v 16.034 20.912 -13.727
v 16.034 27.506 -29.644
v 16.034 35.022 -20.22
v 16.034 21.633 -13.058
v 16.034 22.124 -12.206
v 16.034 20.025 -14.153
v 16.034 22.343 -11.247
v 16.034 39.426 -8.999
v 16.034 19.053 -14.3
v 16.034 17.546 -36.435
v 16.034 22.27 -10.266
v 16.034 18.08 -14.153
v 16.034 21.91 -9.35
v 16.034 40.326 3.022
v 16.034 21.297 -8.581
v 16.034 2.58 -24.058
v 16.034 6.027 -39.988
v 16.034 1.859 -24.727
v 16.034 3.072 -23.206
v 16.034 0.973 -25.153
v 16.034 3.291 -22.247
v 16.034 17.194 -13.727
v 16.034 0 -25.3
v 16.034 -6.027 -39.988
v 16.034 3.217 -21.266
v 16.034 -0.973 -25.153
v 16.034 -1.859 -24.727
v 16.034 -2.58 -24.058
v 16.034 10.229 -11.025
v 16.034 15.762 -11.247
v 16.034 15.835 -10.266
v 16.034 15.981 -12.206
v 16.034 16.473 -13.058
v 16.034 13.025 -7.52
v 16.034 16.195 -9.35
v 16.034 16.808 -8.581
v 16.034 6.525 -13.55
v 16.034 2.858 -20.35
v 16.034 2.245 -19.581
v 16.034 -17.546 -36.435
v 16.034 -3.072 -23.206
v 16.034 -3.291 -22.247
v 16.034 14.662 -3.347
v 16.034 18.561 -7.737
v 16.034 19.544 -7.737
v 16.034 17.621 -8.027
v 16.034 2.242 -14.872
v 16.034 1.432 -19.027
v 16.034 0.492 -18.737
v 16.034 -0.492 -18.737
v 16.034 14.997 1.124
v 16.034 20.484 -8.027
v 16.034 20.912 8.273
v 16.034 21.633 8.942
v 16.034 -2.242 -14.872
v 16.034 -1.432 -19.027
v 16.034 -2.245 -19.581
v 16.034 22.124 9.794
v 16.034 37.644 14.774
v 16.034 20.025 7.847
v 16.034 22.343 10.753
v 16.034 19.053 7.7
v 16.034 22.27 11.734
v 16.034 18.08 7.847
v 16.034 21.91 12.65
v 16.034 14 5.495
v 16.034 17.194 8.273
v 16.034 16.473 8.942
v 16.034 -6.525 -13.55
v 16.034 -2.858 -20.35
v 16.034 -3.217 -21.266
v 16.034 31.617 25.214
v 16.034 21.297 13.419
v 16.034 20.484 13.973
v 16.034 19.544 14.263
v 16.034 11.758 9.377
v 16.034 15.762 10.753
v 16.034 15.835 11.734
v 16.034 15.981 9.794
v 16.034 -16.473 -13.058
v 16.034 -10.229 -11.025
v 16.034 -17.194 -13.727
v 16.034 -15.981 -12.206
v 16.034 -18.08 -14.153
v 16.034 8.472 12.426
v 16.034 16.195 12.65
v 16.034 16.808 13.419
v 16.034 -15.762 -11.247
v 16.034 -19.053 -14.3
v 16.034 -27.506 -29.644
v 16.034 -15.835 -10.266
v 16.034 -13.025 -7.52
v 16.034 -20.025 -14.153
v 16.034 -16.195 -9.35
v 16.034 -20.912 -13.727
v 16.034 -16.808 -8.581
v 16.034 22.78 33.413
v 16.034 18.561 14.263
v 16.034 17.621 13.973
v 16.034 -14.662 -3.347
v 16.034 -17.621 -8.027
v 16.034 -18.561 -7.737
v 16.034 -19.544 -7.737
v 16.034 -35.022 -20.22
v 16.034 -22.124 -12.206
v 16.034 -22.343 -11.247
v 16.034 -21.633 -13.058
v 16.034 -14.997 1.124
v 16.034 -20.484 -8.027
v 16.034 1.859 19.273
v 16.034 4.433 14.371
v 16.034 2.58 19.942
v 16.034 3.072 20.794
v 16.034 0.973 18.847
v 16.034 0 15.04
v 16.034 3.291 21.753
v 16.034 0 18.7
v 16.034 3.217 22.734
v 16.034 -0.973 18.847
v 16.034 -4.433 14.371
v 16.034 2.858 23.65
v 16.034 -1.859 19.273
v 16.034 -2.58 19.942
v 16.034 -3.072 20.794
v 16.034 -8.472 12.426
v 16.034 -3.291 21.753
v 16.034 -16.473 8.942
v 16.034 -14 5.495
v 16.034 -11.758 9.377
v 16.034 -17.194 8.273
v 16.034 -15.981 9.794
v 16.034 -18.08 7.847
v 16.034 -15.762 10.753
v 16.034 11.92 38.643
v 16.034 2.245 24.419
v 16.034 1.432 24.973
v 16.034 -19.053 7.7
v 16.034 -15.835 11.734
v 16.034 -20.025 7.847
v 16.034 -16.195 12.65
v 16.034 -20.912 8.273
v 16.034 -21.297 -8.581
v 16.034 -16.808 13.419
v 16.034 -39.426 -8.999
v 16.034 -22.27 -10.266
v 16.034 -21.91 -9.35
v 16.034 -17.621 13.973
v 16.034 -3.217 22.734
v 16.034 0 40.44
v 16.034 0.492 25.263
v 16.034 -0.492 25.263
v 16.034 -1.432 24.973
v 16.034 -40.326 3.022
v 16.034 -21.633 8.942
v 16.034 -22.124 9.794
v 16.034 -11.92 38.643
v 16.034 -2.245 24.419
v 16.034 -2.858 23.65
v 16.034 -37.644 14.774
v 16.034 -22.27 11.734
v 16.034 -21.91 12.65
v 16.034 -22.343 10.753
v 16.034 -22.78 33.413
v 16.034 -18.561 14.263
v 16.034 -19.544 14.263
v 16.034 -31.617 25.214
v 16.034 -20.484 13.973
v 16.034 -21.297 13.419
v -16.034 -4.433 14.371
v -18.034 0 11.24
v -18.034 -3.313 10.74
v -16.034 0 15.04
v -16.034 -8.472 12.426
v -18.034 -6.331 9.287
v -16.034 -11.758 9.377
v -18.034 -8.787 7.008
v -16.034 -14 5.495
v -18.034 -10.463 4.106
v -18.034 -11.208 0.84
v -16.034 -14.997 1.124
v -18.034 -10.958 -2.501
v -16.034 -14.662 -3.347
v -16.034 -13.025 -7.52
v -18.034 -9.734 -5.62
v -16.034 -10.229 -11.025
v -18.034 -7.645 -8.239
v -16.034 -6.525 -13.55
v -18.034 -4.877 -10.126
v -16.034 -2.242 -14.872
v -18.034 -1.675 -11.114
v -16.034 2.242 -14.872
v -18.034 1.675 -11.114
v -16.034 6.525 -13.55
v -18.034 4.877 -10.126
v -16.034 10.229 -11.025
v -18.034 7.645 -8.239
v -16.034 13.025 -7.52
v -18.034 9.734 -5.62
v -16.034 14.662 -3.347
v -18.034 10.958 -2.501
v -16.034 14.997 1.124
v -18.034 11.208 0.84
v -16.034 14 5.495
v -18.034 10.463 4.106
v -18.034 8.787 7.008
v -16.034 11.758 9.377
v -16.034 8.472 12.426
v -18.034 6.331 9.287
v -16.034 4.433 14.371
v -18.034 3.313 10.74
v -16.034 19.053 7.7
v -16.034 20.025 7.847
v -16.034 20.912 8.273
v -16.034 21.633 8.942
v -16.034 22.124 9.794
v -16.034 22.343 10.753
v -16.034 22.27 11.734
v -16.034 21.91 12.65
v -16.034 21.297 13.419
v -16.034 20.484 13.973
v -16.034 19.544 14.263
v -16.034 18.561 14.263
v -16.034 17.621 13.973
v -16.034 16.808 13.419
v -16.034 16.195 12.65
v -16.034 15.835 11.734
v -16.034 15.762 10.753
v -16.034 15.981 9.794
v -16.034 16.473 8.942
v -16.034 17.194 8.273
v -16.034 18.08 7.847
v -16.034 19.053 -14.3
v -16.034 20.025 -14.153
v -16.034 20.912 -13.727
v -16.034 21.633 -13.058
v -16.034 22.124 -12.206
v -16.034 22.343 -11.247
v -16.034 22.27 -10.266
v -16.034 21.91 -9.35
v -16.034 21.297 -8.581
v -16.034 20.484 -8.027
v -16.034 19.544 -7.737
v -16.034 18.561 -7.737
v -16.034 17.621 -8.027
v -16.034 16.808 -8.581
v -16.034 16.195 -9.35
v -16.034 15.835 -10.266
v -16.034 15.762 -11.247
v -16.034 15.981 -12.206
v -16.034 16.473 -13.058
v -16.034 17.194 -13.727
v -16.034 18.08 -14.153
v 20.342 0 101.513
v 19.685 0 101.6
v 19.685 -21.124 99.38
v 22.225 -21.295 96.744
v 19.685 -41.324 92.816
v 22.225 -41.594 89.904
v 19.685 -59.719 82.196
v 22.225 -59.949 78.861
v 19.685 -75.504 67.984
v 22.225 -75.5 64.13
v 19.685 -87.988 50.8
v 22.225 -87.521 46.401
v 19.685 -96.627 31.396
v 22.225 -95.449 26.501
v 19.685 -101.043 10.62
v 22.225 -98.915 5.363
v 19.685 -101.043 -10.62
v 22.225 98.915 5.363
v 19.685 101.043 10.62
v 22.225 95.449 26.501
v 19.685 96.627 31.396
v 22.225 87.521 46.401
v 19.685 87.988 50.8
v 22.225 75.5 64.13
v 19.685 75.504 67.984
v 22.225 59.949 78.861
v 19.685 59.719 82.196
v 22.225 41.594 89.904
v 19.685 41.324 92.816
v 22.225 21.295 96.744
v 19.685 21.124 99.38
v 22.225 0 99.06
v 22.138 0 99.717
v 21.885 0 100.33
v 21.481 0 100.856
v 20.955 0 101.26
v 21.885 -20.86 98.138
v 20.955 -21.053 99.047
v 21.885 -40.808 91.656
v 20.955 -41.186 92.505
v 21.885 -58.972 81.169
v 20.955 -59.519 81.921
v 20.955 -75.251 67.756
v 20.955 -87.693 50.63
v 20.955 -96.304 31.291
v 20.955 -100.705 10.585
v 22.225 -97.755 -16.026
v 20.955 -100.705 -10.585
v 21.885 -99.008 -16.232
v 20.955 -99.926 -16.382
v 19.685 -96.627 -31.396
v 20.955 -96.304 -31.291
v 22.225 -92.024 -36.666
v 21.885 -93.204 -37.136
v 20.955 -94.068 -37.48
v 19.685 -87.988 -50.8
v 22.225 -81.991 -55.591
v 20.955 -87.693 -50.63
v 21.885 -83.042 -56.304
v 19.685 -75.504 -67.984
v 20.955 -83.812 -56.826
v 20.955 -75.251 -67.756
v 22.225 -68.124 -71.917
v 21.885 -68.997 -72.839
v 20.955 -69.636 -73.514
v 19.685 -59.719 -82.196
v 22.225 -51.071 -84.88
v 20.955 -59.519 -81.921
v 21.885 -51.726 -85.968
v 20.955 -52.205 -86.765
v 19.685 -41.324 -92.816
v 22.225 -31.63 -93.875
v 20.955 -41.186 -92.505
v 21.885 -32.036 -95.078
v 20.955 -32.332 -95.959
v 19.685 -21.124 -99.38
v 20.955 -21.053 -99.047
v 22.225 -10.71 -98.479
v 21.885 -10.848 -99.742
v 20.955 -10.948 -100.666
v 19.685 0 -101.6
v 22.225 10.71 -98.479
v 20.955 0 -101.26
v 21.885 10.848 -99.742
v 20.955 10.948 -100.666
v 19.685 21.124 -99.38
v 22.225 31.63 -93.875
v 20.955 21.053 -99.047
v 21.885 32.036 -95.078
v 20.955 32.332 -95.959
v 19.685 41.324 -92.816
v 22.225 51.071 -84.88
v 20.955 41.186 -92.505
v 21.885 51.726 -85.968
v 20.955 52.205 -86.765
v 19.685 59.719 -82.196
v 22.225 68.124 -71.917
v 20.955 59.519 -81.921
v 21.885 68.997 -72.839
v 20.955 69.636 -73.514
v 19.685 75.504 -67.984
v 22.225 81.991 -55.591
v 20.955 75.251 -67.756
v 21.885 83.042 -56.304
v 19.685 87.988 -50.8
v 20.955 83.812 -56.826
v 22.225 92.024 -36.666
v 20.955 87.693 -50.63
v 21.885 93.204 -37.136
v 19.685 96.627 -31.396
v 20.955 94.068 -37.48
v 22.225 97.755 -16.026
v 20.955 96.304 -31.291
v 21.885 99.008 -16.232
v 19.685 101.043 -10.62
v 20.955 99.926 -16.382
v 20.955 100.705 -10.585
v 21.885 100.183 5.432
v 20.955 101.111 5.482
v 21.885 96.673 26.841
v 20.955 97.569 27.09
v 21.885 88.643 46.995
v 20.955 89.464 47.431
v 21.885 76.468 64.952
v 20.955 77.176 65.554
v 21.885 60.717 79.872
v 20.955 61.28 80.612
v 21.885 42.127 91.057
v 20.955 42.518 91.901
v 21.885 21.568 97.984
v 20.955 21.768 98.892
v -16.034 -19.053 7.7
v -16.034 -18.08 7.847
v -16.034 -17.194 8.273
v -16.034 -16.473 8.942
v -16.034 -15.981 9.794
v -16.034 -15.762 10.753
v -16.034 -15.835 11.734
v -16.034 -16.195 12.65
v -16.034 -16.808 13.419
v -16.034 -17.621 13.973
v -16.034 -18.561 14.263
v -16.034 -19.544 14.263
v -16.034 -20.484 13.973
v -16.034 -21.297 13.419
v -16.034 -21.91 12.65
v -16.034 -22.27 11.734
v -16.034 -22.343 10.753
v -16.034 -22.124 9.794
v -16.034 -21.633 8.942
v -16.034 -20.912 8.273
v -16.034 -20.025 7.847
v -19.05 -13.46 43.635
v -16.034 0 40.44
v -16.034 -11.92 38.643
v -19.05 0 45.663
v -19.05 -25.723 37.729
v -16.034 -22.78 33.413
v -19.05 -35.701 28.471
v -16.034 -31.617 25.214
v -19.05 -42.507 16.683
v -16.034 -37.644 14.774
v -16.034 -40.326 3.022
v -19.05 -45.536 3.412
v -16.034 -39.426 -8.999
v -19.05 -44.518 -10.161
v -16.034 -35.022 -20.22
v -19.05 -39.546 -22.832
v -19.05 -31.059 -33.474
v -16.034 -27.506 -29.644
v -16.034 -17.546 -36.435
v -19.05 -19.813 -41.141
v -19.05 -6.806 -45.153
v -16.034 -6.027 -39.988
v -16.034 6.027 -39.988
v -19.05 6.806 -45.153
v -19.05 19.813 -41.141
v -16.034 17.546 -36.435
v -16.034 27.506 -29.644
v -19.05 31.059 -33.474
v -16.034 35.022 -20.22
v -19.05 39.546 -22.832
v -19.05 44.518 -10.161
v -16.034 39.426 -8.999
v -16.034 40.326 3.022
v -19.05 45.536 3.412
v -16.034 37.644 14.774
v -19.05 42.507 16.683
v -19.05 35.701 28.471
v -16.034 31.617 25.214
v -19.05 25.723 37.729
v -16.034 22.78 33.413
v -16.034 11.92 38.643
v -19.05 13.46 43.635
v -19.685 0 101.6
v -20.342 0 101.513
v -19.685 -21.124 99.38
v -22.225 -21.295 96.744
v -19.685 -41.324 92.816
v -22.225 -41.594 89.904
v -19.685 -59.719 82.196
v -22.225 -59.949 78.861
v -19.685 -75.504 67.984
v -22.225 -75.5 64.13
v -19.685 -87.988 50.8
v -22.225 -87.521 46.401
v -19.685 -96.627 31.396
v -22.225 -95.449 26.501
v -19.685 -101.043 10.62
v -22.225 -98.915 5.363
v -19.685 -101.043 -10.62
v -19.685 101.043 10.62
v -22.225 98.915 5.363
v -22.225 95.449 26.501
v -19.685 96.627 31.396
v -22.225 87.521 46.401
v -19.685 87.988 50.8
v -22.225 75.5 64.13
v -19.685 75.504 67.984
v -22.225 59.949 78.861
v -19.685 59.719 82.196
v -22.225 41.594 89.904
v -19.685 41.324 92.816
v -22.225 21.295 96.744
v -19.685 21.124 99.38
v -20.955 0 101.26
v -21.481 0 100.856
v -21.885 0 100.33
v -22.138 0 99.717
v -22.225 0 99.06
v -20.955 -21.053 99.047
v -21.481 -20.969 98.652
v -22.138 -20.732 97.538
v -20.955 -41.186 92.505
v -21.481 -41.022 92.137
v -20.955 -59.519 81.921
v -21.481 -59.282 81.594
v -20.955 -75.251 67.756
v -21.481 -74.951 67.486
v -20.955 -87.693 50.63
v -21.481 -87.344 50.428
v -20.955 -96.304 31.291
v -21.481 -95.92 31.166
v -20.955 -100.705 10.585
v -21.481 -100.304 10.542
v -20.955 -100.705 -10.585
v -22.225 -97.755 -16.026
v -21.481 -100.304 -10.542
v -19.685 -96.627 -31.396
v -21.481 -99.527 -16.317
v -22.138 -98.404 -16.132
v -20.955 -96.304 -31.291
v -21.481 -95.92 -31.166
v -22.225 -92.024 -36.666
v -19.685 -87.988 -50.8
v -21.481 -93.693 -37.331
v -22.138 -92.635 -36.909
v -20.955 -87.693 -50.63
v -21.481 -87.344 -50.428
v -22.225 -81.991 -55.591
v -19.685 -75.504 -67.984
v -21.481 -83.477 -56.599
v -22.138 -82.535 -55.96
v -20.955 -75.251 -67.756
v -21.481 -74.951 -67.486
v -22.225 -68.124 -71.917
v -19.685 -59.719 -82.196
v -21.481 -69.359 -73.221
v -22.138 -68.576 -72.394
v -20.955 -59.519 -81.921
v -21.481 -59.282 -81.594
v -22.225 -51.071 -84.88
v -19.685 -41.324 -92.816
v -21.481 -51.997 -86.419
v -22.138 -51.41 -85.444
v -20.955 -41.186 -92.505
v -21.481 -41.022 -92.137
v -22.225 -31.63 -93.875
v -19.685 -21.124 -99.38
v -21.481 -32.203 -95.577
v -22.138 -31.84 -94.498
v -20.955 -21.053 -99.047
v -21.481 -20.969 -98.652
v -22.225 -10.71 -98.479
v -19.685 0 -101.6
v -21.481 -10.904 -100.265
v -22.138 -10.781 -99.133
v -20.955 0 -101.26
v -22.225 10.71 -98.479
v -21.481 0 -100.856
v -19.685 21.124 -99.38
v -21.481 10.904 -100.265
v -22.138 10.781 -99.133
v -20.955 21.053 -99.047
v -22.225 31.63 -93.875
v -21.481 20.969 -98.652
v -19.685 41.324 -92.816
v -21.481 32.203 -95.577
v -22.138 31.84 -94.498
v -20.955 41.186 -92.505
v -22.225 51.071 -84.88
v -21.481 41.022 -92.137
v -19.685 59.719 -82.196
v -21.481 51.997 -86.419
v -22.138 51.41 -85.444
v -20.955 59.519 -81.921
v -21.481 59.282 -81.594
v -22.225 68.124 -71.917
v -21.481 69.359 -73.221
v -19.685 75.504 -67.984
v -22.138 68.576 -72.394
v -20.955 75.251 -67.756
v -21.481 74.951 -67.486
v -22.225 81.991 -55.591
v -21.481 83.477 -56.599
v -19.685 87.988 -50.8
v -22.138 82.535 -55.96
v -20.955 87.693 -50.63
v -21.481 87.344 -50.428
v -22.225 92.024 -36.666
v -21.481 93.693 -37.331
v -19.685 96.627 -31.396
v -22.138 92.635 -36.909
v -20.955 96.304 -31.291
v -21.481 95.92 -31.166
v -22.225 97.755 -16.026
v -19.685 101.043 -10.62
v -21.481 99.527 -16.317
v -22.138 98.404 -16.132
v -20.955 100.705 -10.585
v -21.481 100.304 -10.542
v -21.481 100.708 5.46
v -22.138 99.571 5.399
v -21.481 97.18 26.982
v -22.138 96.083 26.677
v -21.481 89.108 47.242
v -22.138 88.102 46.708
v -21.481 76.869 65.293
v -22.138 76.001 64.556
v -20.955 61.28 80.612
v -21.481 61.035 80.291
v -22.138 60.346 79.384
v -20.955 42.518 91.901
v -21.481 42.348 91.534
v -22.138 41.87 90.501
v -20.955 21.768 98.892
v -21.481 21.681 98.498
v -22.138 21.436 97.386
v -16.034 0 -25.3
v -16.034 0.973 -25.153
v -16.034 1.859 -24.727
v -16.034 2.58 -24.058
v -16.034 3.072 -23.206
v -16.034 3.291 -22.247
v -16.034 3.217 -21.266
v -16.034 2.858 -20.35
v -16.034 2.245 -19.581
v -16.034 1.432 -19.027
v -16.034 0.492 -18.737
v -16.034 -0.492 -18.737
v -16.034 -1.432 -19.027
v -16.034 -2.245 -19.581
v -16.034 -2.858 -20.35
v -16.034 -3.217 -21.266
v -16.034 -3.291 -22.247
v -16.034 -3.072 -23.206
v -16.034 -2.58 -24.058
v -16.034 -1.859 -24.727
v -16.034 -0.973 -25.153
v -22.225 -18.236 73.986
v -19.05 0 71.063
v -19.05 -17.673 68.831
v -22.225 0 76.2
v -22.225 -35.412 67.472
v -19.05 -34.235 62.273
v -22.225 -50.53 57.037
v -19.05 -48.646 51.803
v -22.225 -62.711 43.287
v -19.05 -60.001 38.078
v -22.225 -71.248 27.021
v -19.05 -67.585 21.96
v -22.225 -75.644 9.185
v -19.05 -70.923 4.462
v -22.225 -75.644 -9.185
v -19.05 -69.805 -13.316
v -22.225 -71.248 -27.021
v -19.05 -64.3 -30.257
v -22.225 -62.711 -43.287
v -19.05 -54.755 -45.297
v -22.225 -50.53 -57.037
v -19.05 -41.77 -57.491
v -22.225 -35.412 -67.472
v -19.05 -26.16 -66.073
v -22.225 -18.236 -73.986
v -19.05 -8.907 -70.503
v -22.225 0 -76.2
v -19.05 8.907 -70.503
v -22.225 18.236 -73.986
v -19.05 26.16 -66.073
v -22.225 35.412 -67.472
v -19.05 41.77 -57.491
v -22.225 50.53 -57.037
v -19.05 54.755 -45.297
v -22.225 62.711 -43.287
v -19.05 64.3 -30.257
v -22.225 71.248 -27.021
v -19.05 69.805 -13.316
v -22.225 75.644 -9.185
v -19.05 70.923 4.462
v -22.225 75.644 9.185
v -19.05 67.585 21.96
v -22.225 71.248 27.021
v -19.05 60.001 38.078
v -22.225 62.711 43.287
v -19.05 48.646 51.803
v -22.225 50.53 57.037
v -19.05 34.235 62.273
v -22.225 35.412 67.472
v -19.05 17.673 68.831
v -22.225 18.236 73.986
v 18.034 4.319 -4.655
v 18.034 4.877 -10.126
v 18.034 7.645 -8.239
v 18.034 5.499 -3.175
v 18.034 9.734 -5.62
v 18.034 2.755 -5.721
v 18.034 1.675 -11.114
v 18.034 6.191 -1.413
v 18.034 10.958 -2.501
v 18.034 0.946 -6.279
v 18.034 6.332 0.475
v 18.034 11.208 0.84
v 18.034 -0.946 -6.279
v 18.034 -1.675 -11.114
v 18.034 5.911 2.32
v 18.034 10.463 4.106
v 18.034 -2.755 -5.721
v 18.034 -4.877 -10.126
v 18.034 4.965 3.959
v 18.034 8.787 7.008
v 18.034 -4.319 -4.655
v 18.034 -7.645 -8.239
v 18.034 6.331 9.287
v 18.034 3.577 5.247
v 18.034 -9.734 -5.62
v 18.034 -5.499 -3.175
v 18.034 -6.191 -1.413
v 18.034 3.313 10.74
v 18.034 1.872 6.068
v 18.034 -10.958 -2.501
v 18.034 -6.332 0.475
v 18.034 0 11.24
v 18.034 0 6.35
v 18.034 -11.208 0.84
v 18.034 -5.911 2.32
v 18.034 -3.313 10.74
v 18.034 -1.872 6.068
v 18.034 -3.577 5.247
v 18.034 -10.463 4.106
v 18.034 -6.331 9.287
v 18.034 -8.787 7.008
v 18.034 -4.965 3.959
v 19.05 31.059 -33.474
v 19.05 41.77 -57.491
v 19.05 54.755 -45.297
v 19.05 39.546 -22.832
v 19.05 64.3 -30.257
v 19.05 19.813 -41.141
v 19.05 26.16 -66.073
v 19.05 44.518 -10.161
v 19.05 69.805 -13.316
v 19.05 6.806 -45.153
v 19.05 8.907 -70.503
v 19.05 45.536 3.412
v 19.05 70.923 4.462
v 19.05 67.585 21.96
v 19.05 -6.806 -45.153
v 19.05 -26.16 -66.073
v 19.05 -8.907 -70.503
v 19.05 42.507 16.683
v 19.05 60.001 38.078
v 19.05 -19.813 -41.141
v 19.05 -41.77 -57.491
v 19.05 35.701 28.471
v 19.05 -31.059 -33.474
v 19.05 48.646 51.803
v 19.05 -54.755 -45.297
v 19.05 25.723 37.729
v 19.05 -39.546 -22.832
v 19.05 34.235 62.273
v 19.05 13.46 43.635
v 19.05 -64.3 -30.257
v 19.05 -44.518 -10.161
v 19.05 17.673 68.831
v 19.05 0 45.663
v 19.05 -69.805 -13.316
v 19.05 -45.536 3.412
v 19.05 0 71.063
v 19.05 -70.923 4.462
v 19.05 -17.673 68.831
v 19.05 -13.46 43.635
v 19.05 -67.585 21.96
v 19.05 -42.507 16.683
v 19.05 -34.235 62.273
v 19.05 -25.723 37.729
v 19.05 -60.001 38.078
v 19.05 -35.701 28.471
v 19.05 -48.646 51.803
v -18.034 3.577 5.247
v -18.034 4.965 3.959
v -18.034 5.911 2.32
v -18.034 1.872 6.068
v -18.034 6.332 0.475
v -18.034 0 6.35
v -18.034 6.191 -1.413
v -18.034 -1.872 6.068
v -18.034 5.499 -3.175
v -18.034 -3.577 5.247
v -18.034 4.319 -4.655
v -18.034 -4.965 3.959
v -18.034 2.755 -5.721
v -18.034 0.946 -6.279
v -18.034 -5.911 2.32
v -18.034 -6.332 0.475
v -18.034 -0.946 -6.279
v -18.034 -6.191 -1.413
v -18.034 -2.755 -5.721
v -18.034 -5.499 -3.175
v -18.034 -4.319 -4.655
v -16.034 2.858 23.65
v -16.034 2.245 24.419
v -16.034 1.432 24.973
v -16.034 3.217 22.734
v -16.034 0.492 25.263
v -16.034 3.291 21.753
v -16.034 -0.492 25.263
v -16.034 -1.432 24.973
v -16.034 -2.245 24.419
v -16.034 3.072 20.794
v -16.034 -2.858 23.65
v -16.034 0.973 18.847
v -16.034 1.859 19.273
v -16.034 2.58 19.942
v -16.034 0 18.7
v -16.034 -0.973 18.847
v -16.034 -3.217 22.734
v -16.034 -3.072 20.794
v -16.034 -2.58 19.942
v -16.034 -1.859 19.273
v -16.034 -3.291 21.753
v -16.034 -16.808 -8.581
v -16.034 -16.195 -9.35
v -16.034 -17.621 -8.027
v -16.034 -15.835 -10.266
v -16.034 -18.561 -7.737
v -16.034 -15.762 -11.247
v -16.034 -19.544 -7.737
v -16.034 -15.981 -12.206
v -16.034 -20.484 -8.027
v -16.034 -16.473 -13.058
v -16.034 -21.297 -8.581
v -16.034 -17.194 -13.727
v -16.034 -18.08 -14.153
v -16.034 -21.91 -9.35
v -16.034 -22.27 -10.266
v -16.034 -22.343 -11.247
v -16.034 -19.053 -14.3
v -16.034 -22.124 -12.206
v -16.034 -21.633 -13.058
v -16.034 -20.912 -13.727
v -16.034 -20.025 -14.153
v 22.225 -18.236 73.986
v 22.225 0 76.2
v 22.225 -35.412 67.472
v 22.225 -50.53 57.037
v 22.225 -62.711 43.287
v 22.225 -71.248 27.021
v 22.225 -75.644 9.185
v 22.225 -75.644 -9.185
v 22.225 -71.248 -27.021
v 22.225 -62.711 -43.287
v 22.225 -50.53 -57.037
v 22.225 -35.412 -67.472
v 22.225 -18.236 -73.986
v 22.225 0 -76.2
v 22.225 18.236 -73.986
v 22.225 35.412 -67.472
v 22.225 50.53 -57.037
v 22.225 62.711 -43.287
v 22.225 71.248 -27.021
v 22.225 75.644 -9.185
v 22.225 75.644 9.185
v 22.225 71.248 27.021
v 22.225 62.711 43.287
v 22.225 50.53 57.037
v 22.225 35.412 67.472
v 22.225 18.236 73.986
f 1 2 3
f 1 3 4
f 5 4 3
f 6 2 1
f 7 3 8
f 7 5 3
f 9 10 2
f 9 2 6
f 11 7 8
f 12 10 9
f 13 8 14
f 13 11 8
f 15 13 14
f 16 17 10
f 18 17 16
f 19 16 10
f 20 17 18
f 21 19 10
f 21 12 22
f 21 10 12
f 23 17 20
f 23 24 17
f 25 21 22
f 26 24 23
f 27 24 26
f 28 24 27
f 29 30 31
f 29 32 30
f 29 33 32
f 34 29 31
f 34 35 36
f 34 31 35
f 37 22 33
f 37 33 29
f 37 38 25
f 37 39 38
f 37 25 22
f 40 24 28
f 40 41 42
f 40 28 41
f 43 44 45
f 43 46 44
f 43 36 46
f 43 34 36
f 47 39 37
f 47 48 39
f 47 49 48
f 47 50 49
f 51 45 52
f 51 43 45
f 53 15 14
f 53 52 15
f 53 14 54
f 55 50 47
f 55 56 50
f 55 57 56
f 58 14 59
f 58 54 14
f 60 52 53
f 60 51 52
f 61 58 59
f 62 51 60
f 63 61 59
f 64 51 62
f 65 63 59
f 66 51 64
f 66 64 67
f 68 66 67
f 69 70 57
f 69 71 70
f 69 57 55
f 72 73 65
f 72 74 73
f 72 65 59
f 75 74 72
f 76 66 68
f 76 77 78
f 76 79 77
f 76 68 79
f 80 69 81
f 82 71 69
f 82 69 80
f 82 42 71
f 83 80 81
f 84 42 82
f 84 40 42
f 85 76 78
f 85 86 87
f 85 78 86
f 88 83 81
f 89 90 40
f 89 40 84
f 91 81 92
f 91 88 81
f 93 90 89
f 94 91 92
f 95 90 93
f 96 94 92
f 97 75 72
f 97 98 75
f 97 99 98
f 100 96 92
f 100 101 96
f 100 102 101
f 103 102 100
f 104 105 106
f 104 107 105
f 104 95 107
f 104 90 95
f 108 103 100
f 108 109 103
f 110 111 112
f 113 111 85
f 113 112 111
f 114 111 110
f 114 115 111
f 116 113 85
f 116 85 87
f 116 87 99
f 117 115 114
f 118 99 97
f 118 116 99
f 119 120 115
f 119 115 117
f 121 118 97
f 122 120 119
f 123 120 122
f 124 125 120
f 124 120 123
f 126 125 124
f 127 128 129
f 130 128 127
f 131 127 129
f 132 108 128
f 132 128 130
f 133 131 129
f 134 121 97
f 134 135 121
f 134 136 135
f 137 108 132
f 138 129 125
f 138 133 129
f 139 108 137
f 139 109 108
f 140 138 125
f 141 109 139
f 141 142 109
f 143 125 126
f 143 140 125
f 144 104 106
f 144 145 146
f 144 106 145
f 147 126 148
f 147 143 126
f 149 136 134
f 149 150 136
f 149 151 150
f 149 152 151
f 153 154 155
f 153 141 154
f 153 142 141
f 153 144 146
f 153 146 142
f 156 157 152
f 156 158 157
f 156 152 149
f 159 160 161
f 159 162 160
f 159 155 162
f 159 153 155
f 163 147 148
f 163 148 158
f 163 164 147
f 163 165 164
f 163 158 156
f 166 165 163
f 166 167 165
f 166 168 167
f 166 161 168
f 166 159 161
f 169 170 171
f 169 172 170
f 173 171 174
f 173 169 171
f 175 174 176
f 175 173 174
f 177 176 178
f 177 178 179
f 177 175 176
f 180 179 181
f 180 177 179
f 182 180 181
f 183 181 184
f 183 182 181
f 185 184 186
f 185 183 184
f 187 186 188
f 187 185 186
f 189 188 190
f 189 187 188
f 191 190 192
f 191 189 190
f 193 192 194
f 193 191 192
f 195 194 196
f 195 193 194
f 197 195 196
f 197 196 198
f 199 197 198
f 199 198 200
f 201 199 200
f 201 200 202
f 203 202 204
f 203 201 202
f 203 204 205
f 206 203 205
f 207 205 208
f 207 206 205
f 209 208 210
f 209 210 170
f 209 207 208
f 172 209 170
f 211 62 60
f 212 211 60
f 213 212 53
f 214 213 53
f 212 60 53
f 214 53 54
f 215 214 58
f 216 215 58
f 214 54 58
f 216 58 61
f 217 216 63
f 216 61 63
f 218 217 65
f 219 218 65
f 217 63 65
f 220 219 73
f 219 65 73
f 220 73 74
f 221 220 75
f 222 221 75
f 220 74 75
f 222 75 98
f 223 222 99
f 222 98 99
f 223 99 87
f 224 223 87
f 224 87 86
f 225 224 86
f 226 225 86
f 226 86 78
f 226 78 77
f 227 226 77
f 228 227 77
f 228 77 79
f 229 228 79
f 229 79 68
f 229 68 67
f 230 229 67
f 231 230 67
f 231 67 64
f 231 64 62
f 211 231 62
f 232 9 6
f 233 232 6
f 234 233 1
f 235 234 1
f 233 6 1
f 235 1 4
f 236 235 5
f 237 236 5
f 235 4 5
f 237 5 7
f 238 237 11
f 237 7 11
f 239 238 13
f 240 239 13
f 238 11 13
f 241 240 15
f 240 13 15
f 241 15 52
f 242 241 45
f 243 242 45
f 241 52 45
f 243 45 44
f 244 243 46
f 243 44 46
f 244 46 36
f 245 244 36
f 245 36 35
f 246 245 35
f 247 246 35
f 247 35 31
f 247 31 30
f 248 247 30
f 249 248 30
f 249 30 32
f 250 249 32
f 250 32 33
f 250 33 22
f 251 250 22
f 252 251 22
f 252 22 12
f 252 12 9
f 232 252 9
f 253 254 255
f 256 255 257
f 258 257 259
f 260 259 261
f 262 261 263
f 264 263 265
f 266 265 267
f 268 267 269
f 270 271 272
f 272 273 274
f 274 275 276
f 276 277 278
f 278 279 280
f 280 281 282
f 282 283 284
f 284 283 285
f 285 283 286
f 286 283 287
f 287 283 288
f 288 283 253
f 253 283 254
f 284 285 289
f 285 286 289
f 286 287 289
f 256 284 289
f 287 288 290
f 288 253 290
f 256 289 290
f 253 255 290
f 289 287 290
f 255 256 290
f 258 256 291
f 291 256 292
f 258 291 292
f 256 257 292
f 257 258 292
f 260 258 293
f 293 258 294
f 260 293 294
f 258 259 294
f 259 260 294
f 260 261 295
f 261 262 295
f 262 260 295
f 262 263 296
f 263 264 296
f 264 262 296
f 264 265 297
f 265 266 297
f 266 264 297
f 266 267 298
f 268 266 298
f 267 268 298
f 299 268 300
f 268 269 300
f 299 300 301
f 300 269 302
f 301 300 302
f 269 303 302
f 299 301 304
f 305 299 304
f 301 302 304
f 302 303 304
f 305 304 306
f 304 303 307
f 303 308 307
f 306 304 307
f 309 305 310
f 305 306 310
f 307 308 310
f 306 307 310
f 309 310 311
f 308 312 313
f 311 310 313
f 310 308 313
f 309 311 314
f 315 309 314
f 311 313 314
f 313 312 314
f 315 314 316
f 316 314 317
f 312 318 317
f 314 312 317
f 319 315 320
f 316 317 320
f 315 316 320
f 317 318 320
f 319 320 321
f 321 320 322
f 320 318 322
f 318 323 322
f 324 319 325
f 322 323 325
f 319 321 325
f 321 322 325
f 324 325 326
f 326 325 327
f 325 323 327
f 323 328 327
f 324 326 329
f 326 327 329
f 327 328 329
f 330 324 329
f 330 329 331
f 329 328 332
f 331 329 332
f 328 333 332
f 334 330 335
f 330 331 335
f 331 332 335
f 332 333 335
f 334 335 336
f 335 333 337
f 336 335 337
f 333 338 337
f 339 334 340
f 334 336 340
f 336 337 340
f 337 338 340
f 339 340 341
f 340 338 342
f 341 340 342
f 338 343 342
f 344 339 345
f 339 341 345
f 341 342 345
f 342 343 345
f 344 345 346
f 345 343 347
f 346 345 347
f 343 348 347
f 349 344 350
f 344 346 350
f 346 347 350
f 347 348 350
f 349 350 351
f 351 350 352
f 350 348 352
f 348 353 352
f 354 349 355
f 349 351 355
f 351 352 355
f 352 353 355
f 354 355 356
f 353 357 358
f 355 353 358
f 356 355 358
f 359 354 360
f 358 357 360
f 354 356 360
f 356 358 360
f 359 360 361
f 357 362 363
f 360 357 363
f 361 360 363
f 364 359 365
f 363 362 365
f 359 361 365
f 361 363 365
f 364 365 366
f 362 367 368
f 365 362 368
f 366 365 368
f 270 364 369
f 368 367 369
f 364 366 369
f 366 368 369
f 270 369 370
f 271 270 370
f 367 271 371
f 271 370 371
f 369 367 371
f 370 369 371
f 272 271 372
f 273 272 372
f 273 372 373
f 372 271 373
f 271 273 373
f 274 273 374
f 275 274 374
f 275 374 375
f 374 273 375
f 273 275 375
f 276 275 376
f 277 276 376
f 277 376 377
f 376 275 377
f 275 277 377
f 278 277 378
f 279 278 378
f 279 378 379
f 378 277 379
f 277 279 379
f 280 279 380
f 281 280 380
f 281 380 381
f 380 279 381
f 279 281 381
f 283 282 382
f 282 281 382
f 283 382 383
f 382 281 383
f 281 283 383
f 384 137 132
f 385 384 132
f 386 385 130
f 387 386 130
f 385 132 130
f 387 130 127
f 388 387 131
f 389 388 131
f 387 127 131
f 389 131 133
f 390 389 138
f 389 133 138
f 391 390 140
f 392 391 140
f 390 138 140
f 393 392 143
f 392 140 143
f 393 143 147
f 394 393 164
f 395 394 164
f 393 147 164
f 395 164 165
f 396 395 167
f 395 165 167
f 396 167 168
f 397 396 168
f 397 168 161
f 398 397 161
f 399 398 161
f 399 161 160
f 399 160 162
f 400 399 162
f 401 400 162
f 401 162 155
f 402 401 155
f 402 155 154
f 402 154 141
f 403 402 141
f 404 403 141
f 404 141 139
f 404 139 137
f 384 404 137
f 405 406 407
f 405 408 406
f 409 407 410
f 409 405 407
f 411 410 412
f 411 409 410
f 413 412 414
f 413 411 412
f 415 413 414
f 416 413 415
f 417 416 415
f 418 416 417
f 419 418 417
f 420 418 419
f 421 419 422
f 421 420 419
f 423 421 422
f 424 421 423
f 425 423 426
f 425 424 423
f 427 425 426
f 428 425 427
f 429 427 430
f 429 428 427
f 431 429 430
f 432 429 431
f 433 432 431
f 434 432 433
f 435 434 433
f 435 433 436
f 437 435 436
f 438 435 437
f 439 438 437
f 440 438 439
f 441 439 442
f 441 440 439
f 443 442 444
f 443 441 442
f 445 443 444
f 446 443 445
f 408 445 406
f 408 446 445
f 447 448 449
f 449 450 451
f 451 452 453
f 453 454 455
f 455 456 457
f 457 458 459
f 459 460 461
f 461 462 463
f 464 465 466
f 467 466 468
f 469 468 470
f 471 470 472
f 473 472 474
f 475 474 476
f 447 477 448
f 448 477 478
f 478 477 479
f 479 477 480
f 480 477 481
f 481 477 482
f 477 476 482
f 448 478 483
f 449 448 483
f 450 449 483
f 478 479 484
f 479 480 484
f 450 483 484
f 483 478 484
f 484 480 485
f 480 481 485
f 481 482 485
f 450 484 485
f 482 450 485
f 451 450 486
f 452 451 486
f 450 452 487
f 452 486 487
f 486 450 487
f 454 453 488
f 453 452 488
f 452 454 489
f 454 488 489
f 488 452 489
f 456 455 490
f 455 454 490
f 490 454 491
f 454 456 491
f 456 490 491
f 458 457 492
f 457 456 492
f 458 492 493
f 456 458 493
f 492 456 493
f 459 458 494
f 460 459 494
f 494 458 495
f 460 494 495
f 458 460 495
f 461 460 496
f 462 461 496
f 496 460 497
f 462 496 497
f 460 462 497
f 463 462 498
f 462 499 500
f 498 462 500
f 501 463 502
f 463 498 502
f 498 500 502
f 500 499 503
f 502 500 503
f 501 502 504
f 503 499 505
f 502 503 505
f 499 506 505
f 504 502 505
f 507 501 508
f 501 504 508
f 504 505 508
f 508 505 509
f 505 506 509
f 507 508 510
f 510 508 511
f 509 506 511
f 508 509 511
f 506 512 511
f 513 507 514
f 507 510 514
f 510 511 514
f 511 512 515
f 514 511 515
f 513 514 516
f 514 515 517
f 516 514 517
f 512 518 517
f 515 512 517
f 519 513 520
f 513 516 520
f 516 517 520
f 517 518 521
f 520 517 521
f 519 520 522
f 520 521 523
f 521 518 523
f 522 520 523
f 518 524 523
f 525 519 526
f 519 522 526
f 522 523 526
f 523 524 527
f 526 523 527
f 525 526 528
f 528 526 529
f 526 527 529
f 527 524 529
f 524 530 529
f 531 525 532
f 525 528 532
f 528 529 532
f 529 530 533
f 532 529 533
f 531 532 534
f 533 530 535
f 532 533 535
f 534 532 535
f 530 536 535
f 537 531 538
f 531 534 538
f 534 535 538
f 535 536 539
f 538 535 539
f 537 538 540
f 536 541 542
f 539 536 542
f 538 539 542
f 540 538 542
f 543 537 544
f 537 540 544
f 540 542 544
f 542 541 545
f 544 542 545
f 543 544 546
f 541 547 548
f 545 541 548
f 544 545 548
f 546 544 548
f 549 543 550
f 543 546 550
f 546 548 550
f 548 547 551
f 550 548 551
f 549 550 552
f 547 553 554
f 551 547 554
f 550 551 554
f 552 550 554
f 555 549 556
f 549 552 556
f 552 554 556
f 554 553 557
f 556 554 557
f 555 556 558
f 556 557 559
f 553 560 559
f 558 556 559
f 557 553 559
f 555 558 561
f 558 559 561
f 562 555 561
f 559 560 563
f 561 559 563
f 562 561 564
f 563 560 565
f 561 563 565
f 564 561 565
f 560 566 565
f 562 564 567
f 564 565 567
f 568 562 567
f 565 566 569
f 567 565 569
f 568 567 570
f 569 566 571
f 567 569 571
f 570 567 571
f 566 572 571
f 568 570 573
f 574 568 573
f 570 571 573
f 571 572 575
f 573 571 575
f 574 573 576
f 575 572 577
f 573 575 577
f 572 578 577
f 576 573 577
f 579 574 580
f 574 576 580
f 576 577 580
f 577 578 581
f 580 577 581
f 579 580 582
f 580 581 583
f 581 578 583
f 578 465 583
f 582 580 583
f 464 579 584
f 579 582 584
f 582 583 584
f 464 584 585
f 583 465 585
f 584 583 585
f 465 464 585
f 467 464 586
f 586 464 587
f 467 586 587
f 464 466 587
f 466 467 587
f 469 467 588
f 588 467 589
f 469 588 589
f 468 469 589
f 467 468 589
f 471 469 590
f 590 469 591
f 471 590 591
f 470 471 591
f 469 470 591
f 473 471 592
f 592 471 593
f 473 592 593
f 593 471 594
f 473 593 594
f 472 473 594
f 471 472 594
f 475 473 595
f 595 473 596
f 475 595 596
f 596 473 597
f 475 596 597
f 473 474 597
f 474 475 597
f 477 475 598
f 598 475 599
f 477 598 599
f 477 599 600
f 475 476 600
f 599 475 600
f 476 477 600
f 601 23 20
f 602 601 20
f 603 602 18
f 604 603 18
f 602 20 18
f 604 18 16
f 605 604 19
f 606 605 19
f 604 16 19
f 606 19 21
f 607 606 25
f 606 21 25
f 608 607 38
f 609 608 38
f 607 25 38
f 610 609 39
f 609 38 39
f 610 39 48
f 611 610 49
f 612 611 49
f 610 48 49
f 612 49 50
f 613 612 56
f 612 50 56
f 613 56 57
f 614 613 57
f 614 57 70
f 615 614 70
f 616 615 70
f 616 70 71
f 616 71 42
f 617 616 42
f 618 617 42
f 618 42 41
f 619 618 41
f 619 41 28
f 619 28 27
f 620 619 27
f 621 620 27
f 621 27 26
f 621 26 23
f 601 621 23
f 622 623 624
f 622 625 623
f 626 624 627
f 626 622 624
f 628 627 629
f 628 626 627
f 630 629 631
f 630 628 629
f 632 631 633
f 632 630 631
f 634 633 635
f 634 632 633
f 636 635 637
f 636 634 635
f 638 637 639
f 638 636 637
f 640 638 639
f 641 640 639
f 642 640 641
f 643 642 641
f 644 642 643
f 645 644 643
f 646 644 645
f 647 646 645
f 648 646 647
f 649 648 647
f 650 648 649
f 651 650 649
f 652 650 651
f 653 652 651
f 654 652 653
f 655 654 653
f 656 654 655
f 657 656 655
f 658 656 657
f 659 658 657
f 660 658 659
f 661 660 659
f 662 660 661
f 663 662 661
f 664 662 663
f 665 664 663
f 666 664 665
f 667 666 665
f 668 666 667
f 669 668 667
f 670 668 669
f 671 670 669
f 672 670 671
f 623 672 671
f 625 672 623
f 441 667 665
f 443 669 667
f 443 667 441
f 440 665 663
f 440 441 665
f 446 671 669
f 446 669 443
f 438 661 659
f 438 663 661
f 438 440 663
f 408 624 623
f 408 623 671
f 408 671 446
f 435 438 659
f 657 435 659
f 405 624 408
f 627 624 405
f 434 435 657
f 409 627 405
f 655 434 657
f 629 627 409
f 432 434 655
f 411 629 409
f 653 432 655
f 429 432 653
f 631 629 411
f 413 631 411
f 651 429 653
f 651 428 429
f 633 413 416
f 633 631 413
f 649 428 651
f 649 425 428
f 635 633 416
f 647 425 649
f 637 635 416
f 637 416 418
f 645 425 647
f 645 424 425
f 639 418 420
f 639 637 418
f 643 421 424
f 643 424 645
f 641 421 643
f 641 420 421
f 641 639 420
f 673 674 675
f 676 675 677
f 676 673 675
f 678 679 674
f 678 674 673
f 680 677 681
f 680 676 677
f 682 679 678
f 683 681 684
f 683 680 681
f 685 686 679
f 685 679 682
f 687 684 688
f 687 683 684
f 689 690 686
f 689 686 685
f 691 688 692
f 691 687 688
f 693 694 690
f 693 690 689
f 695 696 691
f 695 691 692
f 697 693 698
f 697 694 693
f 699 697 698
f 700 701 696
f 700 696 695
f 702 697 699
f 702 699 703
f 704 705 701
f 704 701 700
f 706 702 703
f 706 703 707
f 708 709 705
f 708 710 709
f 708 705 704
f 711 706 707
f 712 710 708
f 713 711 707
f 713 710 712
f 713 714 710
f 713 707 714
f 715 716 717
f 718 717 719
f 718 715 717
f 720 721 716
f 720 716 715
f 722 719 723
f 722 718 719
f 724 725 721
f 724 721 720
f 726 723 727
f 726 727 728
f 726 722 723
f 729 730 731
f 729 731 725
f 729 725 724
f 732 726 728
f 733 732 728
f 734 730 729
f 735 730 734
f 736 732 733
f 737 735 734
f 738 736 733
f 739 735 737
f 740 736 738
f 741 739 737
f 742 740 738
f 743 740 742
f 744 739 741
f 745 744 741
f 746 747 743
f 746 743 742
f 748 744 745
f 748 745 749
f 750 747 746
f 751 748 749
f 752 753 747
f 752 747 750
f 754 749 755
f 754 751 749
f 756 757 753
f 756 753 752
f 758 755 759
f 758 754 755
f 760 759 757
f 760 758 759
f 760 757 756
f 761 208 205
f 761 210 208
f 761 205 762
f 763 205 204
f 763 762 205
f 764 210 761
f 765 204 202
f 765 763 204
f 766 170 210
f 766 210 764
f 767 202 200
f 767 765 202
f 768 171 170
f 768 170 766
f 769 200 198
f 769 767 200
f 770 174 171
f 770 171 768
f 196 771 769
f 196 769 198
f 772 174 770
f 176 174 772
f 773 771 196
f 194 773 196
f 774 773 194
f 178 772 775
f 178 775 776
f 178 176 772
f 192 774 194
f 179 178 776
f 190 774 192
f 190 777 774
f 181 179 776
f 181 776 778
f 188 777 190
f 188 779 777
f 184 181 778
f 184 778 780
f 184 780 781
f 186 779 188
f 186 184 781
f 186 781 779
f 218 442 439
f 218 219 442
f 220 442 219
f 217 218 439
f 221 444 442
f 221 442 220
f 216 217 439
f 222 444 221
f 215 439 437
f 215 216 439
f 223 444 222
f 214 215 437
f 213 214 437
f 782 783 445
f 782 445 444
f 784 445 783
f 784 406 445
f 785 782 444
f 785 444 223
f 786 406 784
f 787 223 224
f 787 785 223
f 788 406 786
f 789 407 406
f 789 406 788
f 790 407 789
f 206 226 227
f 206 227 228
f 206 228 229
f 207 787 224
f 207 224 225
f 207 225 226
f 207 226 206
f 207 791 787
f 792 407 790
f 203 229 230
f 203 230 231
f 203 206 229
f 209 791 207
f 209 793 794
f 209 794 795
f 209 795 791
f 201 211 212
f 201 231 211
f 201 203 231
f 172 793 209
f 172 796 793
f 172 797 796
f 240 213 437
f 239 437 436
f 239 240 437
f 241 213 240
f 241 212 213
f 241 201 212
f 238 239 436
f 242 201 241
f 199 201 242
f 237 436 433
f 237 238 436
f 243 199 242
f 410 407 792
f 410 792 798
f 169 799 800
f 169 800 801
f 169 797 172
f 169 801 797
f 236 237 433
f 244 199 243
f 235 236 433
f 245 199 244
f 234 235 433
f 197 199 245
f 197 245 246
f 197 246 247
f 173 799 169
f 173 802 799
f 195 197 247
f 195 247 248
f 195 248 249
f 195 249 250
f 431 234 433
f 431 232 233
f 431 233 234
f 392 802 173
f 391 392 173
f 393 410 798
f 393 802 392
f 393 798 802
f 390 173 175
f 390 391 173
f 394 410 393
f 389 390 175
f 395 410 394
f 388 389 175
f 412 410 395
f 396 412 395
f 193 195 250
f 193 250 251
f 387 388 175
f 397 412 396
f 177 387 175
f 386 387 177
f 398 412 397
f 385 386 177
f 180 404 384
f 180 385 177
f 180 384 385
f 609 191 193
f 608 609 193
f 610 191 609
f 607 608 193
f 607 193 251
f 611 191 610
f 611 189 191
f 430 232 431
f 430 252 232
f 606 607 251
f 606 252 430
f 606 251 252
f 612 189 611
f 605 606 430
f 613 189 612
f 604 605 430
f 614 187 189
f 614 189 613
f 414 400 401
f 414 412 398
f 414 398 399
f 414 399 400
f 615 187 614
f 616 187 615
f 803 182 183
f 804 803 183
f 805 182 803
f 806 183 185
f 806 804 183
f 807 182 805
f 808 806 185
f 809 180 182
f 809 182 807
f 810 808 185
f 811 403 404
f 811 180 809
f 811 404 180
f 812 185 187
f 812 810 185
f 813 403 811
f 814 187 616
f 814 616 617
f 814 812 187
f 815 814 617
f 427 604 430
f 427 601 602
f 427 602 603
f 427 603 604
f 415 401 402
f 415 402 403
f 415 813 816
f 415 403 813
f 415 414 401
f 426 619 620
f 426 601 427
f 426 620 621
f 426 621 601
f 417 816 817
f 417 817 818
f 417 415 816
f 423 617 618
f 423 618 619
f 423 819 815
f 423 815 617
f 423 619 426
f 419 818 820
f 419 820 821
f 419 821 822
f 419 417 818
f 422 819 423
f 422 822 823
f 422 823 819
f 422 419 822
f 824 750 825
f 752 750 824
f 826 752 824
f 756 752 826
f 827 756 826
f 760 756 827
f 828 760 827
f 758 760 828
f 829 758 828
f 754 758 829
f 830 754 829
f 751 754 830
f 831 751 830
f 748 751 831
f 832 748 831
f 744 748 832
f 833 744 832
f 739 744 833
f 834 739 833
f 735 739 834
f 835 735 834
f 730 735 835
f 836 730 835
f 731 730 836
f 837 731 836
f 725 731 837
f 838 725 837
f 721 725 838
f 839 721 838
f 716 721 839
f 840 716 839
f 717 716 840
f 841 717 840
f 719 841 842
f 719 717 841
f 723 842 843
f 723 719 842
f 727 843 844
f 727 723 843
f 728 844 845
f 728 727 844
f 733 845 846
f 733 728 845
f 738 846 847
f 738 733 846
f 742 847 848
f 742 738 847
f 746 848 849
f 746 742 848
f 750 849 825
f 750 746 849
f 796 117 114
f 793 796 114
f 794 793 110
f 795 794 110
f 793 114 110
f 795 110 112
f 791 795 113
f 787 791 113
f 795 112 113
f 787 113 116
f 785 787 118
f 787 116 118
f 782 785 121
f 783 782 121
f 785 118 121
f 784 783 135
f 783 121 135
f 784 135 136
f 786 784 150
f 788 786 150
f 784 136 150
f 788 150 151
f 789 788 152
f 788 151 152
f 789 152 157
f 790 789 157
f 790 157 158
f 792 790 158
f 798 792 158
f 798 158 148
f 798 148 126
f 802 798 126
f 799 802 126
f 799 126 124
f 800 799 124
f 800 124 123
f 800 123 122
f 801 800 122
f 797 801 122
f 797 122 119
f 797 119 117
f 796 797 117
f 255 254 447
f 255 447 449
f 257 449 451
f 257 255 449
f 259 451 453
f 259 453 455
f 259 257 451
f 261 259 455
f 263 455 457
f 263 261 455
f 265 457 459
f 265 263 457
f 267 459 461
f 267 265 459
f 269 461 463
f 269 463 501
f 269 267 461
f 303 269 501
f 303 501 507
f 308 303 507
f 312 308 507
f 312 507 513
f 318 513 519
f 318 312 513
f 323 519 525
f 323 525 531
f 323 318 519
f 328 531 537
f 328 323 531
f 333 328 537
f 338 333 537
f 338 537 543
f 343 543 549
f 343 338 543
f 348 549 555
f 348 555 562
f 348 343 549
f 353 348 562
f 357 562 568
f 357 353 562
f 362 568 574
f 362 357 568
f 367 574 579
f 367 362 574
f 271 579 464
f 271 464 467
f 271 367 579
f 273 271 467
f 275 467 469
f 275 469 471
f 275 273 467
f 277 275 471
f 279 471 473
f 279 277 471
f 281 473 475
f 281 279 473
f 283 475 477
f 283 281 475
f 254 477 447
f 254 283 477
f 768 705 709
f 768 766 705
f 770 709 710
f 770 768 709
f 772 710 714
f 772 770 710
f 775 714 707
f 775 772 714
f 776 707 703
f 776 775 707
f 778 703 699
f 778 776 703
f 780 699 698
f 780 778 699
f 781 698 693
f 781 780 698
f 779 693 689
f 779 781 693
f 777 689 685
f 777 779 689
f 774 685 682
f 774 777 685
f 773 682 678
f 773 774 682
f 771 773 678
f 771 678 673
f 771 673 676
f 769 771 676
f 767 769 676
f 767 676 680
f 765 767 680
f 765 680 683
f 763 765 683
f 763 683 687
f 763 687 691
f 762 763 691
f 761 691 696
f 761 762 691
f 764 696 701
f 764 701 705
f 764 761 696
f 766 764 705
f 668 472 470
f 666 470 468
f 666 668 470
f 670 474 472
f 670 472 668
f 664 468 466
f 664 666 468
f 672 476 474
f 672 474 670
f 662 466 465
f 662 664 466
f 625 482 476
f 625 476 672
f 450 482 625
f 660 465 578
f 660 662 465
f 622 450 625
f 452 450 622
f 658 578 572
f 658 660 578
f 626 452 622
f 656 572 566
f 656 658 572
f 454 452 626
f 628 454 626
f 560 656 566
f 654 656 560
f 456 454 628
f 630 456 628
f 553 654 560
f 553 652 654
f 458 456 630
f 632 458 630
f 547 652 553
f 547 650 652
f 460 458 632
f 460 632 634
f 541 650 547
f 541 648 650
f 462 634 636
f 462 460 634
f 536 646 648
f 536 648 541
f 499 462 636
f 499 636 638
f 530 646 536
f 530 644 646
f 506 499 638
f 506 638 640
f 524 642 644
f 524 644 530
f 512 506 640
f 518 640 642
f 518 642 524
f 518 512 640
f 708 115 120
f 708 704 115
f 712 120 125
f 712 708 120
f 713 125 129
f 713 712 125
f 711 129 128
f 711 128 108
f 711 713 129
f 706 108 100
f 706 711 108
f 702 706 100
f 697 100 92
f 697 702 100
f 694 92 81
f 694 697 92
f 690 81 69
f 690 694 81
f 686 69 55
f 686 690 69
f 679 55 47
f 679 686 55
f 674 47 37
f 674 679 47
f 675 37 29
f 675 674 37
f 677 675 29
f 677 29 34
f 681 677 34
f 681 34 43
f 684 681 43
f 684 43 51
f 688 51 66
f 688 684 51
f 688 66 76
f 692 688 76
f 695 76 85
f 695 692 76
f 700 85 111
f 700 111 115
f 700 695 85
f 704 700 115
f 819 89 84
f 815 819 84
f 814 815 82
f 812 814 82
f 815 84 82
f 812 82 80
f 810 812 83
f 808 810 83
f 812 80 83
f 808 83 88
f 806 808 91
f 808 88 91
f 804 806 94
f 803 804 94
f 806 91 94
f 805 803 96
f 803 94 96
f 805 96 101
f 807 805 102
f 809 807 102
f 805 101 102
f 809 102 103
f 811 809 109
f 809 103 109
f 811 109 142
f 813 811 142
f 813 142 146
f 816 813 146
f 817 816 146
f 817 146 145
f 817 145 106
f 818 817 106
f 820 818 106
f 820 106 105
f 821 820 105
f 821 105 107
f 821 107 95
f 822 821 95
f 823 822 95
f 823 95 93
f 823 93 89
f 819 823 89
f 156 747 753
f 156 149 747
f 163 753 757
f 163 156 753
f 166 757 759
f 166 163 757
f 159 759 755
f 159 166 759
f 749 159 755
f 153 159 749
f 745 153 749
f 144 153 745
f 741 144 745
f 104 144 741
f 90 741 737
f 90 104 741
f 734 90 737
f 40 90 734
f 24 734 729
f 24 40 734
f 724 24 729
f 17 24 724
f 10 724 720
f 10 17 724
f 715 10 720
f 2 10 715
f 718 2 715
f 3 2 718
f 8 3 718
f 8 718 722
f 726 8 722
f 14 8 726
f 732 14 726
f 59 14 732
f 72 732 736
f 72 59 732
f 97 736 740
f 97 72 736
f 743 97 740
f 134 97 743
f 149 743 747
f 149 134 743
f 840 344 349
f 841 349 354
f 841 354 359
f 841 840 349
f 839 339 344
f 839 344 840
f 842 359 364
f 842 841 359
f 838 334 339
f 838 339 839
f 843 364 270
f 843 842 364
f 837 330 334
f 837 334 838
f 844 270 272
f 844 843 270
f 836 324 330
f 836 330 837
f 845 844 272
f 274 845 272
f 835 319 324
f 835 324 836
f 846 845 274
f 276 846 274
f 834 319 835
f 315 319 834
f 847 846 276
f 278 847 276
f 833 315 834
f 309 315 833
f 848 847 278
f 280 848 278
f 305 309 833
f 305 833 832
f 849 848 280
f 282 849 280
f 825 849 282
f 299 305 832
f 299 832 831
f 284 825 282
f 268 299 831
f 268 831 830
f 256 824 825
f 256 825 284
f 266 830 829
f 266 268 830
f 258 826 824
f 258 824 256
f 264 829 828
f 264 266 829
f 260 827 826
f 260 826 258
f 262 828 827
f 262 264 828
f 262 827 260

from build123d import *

# Parameters (mm, degrees)
SKETCH3_R          = 3.3
CUT_EXTRUDE1_DEPTH = 39.259
FILLET1_R          = 2.54


with BuildPart() as part:
    # Sketch2 → Revolve1 (revolve)
    with BuildSketch(Plane(origin=(0, 0, 0), x_dir=(1, 0, 0), z_dir=(0, 1, 0))):
        Polygon((22.225, -101.6), (22.225, -76.2), (19.05, -71.063365236), (19.05, -45.663365236), (16.034, -40.4395), (16.034, -15.0395), (18.034, -11.2395), (18.034, -6.35), (-18.034, -6.35), (-18.034, -11.2395), (-16.034, -15.0395), (-16.034, -40.4395), (-19.05, -45.663365236), (-19.05, -71.063365236), (-22.225, -76.2), (-22.225, -101.6), align=None)
    revolve(axis=Axis((0, 0, 0), (1, 0, 0)))

    # Sketch3 → Cut-Extrude1 (cut, through all)
    with BuildSketch(Plane(origin=(16.034, 0, 0), x_dir=(0, 0, -1), z_dir=(1, 0, 0))):
        with Locations((22, 0)):
            Circle(SKETCH3_R)
        with Locations((11, -19.052558883)):
            Circle(SKETCH3_R)
        with Locations((-11, -19.052558883)):
            Circle(SKETCH3_R)
        with Locations((-22, 0)):
            Circle(SKETCH3_R)
        with Locations((-11, 19.052558883)):
            Circle(SKETCH3_R)
        with Locations((11, 19.052558883)):
            Circle(SKETCH3_R)
    extrude(amount=-CUT_EXTRUDE1_DEPTH, mode=Mode.SUBTRACT)

    # Fillet1
    fillet1_edges = [part.edges().sort_by_distance(p)[0] for p in [
        (22.225, 0, -101.6),
        (-22.225, 0, -101.6),
    ]]
    fillet(fillet1_edges, radius=FILLET1_R)


solid = part.part
